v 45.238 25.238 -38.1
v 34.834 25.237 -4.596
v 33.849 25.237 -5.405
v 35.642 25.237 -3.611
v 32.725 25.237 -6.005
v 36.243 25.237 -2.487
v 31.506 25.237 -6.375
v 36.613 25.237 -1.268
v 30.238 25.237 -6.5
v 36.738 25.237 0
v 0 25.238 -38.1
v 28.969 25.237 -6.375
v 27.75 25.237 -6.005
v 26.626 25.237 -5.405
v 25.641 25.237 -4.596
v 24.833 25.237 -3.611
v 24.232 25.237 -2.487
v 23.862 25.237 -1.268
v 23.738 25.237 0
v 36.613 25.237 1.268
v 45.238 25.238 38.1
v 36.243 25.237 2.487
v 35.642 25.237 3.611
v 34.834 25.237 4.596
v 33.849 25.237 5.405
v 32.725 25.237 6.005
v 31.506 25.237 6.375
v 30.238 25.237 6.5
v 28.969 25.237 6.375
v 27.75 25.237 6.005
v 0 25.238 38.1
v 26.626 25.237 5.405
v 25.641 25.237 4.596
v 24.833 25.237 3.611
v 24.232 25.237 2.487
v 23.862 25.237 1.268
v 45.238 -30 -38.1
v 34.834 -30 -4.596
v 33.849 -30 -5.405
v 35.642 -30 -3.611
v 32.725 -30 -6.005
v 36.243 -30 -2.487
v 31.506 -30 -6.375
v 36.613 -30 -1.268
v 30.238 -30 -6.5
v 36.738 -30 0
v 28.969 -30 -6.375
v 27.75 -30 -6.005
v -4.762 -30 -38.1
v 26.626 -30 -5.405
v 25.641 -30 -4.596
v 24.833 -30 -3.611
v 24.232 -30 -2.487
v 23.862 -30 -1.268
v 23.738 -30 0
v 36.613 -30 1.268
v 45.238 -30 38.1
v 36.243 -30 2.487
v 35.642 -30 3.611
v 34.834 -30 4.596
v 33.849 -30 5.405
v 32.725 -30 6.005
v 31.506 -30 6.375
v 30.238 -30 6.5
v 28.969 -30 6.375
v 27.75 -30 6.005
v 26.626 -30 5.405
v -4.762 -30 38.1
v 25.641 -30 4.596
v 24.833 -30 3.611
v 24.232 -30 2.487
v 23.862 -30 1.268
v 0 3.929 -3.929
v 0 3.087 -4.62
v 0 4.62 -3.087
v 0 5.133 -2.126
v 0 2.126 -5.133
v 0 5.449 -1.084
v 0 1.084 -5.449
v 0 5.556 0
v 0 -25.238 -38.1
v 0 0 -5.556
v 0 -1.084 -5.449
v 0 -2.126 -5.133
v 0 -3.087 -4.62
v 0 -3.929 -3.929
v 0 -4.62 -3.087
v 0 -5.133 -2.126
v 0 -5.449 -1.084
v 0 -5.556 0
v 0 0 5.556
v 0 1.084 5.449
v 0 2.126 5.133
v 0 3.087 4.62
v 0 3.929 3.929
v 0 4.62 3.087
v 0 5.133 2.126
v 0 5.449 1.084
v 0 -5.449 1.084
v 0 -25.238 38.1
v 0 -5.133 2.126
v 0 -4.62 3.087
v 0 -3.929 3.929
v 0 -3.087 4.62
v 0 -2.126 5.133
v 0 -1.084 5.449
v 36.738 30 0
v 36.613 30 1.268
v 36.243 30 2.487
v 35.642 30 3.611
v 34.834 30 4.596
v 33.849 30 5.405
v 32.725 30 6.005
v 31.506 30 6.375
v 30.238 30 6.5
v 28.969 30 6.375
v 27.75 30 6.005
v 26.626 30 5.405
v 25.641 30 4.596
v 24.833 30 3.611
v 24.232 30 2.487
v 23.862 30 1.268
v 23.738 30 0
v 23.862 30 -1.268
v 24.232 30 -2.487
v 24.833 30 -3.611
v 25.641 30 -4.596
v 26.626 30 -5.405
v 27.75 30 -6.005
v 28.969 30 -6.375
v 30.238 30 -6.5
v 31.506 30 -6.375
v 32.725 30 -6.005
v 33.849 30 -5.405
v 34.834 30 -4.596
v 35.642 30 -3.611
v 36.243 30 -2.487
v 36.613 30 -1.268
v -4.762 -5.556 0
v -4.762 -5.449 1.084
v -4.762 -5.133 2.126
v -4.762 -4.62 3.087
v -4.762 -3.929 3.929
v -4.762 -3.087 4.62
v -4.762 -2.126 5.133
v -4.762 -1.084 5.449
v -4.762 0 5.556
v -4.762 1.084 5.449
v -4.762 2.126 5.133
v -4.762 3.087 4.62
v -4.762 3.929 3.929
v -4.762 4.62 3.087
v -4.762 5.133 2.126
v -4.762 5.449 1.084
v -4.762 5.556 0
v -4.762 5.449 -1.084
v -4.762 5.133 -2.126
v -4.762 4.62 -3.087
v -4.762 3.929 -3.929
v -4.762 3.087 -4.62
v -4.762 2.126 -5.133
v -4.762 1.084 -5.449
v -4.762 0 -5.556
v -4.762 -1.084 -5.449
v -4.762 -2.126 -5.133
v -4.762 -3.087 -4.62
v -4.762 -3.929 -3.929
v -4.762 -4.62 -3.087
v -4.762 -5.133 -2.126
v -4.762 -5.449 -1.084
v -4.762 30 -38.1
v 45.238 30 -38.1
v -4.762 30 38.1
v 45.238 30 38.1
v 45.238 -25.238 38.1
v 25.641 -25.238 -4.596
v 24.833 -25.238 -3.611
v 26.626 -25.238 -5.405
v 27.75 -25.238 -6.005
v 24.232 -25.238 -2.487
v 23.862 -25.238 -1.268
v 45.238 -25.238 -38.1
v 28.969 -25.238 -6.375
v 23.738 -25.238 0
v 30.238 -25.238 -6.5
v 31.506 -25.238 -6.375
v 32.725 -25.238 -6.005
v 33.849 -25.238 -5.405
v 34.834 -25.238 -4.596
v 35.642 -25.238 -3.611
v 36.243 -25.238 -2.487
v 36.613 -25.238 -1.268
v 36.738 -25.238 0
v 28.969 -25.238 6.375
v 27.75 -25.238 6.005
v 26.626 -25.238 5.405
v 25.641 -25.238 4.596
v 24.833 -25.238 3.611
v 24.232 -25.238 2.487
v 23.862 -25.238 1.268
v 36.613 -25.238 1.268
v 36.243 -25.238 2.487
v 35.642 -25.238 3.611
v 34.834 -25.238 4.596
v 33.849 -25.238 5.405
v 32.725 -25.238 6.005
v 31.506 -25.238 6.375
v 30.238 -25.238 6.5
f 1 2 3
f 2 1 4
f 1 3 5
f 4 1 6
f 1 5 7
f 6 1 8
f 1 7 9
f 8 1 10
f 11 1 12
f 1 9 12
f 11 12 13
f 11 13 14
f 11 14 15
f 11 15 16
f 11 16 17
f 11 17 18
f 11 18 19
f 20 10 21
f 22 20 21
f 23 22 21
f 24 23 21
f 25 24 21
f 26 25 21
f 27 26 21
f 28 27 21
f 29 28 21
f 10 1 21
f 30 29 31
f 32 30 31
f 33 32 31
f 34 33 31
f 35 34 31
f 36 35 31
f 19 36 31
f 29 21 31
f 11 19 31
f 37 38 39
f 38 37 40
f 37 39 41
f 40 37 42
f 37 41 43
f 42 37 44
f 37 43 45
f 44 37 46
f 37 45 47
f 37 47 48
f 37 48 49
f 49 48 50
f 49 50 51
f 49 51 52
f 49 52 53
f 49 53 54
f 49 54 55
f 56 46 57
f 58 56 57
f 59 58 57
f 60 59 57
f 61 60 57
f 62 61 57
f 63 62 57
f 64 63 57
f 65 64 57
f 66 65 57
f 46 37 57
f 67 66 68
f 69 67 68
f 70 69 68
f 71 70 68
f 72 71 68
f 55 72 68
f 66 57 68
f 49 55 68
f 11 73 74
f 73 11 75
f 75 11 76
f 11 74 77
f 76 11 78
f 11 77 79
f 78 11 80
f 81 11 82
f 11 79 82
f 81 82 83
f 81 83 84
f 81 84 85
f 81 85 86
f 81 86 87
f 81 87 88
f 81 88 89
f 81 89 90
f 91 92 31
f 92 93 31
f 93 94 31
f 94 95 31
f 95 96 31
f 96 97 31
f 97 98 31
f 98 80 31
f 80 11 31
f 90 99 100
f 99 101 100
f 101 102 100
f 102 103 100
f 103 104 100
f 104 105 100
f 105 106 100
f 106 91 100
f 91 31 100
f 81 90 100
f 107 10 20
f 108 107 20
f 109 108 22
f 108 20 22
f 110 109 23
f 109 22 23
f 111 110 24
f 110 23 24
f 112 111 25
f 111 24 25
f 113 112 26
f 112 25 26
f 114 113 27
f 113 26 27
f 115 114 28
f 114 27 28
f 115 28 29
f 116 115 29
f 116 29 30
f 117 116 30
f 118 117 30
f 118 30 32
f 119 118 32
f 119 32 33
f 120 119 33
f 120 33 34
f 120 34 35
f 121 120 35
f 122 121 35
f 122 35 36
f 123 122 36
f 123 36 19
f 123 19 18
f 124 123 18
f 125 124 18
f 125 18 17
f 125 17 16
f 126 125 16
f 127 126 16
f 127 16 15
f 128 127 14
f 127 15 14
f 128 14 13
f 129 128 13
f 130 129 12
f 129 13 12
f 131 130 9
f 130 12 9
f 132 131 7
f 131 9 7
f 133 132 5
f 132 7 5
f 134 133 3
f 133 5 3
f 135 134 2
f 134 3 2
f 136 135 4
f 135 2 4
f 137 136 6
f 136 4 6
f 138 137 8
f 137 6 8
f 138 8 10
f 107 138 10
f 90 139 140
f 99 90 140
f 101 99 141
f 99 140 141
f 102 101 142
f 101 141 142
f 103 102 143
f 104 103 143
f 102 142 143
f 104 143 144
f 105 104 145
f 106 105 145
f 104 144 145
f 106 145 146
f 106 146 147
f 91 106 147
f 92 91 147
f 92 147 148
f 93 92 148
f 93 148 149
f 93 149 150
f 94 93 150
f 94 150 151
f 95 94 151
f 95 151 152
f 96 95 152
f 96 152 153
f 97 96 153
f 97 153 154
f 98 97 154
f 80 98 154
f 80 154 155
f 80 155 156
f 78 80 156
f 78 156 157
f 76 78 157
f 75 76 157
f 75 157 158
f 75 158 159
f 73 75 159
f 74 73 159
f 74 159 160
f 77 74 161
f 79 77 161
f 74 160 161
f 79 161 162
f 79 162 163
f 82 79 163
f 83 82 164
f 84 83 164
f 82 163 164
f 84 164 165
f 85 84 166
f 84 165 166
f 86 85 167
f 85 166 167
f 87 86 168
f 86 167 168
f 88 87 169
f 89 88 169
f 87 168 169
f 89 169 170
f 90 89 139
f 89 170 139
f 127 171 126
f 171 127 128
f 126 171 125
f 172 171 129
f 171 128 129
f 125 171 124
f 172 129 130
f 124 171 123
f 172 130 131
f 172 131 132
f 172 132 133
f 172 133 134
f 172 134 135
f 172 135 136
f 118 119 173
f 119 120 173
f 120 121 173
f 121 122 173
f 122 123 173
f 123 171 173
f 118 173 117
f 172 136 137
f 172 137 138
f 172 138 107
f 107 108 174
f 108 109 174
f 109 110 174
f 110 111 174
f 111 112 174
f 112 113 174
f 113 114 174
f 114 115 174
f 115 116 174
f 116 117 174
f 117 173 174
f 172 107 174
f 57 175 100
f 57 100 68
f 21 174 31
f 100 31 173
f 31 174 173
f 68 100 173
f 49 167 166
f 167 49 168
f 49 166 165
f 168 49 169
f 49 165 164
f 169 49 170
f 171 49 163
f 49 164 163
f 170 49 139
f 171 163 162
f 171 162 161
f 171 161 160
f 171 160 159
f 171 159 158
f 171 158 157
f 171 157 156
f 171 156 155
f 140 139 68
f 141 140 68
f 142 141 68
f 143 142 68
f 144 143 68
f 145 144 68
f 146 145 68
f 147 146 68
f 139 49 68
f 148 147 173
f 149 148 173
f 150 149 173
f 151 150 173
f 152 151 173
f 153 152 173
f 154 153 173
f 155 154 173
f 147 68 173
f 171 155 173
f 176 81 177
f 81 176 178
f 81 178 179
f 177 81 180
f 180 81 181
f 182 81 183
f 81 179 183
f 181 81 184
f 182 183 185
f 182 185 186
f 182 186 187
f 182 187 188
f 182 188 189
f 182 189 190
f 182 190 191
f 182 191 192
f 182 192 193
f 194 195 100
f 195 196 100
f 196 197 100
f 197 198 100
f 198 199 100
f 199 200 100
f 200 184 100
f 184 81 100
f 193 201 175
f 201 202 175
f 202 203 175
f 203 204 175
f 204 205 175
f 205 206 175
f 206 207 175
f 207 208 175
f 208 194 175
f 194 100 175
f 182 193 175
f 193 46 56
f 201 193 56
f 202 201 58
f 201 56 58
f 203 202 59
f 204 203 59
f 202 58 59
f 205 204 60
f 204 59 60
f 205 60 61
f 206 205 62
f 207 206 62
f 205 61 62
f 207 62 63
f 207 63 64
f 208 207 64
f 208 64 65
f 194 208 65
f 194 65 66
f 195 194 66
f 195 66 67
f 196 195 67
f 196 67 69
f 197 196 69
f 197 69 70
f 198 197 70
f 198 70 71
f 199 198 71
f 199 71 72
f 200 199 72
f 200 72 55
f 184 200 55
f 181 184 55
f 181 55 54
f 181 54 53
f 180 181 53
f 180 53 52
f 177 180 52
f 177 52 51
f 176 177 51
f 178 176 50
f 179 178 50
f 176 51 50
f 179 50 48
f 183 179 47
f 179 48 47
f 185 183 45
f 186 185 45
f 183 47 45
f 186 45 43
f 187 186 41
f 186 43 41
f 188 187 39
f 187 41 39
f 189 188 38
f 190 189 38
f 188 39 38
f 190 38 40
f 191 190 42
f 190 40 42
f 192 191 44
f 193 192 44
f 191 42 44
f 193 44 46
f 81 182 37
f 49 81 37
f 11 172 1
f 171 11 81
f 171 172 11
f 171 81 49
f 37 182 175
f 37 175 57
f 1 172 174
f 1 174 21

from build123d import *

# Parameters (mm, degrees)
SALIENTE_EXTRUIR3_DEPTH = 38.1
CROQUIS7_R              = 5.55625
CORTAR_EXTRUIR1_DEPTH   = 5
CROQUIS8_R              = 6.5
CORTAR_EXTRUIR2_DEPTH   = 70


with BuildPart() as part:
    # Croquis6 → Saliente-Extruir3 (new, symmetric)
    with BuildSketch(Plane.XY):
        Polygon((45.2375, 25.2375), (0, 25.2375), (0, -25.2375), (45.2375, -25.2375), (45.2375, -30), (-4.7625, -30), (-4.7625, 30), (45.2375, 30), align=None)
    extrude(amount=SALIENTE_EXTRUIR3_DEPTH, both=True)

    # Croquis7 → Cortar-Extruir1 (cut)
    with BuildSketch(Plane.ZY.offset(4.7625)):
        with Locations(Location((0, 0, 0), (0, 0, 270))):
            Circle(CROQUIS7_R)
    extrude(amount=-CORTAR_EXTRUIR1_DEPTH, mode=Mode.SUBTRACT)

    # Croquis8 → Cortar-Extruir2 (cut)
    with BuildSketch(Plane.XZ.offset(30)):
        with Locations((30.2375, 0)):
            Circle(CROQUIS8_R)
    extrude(amount=-CORTAR_EXTRUIR2_DEPTH, mode=Mode.SUBTRACT)


solid = part.part
